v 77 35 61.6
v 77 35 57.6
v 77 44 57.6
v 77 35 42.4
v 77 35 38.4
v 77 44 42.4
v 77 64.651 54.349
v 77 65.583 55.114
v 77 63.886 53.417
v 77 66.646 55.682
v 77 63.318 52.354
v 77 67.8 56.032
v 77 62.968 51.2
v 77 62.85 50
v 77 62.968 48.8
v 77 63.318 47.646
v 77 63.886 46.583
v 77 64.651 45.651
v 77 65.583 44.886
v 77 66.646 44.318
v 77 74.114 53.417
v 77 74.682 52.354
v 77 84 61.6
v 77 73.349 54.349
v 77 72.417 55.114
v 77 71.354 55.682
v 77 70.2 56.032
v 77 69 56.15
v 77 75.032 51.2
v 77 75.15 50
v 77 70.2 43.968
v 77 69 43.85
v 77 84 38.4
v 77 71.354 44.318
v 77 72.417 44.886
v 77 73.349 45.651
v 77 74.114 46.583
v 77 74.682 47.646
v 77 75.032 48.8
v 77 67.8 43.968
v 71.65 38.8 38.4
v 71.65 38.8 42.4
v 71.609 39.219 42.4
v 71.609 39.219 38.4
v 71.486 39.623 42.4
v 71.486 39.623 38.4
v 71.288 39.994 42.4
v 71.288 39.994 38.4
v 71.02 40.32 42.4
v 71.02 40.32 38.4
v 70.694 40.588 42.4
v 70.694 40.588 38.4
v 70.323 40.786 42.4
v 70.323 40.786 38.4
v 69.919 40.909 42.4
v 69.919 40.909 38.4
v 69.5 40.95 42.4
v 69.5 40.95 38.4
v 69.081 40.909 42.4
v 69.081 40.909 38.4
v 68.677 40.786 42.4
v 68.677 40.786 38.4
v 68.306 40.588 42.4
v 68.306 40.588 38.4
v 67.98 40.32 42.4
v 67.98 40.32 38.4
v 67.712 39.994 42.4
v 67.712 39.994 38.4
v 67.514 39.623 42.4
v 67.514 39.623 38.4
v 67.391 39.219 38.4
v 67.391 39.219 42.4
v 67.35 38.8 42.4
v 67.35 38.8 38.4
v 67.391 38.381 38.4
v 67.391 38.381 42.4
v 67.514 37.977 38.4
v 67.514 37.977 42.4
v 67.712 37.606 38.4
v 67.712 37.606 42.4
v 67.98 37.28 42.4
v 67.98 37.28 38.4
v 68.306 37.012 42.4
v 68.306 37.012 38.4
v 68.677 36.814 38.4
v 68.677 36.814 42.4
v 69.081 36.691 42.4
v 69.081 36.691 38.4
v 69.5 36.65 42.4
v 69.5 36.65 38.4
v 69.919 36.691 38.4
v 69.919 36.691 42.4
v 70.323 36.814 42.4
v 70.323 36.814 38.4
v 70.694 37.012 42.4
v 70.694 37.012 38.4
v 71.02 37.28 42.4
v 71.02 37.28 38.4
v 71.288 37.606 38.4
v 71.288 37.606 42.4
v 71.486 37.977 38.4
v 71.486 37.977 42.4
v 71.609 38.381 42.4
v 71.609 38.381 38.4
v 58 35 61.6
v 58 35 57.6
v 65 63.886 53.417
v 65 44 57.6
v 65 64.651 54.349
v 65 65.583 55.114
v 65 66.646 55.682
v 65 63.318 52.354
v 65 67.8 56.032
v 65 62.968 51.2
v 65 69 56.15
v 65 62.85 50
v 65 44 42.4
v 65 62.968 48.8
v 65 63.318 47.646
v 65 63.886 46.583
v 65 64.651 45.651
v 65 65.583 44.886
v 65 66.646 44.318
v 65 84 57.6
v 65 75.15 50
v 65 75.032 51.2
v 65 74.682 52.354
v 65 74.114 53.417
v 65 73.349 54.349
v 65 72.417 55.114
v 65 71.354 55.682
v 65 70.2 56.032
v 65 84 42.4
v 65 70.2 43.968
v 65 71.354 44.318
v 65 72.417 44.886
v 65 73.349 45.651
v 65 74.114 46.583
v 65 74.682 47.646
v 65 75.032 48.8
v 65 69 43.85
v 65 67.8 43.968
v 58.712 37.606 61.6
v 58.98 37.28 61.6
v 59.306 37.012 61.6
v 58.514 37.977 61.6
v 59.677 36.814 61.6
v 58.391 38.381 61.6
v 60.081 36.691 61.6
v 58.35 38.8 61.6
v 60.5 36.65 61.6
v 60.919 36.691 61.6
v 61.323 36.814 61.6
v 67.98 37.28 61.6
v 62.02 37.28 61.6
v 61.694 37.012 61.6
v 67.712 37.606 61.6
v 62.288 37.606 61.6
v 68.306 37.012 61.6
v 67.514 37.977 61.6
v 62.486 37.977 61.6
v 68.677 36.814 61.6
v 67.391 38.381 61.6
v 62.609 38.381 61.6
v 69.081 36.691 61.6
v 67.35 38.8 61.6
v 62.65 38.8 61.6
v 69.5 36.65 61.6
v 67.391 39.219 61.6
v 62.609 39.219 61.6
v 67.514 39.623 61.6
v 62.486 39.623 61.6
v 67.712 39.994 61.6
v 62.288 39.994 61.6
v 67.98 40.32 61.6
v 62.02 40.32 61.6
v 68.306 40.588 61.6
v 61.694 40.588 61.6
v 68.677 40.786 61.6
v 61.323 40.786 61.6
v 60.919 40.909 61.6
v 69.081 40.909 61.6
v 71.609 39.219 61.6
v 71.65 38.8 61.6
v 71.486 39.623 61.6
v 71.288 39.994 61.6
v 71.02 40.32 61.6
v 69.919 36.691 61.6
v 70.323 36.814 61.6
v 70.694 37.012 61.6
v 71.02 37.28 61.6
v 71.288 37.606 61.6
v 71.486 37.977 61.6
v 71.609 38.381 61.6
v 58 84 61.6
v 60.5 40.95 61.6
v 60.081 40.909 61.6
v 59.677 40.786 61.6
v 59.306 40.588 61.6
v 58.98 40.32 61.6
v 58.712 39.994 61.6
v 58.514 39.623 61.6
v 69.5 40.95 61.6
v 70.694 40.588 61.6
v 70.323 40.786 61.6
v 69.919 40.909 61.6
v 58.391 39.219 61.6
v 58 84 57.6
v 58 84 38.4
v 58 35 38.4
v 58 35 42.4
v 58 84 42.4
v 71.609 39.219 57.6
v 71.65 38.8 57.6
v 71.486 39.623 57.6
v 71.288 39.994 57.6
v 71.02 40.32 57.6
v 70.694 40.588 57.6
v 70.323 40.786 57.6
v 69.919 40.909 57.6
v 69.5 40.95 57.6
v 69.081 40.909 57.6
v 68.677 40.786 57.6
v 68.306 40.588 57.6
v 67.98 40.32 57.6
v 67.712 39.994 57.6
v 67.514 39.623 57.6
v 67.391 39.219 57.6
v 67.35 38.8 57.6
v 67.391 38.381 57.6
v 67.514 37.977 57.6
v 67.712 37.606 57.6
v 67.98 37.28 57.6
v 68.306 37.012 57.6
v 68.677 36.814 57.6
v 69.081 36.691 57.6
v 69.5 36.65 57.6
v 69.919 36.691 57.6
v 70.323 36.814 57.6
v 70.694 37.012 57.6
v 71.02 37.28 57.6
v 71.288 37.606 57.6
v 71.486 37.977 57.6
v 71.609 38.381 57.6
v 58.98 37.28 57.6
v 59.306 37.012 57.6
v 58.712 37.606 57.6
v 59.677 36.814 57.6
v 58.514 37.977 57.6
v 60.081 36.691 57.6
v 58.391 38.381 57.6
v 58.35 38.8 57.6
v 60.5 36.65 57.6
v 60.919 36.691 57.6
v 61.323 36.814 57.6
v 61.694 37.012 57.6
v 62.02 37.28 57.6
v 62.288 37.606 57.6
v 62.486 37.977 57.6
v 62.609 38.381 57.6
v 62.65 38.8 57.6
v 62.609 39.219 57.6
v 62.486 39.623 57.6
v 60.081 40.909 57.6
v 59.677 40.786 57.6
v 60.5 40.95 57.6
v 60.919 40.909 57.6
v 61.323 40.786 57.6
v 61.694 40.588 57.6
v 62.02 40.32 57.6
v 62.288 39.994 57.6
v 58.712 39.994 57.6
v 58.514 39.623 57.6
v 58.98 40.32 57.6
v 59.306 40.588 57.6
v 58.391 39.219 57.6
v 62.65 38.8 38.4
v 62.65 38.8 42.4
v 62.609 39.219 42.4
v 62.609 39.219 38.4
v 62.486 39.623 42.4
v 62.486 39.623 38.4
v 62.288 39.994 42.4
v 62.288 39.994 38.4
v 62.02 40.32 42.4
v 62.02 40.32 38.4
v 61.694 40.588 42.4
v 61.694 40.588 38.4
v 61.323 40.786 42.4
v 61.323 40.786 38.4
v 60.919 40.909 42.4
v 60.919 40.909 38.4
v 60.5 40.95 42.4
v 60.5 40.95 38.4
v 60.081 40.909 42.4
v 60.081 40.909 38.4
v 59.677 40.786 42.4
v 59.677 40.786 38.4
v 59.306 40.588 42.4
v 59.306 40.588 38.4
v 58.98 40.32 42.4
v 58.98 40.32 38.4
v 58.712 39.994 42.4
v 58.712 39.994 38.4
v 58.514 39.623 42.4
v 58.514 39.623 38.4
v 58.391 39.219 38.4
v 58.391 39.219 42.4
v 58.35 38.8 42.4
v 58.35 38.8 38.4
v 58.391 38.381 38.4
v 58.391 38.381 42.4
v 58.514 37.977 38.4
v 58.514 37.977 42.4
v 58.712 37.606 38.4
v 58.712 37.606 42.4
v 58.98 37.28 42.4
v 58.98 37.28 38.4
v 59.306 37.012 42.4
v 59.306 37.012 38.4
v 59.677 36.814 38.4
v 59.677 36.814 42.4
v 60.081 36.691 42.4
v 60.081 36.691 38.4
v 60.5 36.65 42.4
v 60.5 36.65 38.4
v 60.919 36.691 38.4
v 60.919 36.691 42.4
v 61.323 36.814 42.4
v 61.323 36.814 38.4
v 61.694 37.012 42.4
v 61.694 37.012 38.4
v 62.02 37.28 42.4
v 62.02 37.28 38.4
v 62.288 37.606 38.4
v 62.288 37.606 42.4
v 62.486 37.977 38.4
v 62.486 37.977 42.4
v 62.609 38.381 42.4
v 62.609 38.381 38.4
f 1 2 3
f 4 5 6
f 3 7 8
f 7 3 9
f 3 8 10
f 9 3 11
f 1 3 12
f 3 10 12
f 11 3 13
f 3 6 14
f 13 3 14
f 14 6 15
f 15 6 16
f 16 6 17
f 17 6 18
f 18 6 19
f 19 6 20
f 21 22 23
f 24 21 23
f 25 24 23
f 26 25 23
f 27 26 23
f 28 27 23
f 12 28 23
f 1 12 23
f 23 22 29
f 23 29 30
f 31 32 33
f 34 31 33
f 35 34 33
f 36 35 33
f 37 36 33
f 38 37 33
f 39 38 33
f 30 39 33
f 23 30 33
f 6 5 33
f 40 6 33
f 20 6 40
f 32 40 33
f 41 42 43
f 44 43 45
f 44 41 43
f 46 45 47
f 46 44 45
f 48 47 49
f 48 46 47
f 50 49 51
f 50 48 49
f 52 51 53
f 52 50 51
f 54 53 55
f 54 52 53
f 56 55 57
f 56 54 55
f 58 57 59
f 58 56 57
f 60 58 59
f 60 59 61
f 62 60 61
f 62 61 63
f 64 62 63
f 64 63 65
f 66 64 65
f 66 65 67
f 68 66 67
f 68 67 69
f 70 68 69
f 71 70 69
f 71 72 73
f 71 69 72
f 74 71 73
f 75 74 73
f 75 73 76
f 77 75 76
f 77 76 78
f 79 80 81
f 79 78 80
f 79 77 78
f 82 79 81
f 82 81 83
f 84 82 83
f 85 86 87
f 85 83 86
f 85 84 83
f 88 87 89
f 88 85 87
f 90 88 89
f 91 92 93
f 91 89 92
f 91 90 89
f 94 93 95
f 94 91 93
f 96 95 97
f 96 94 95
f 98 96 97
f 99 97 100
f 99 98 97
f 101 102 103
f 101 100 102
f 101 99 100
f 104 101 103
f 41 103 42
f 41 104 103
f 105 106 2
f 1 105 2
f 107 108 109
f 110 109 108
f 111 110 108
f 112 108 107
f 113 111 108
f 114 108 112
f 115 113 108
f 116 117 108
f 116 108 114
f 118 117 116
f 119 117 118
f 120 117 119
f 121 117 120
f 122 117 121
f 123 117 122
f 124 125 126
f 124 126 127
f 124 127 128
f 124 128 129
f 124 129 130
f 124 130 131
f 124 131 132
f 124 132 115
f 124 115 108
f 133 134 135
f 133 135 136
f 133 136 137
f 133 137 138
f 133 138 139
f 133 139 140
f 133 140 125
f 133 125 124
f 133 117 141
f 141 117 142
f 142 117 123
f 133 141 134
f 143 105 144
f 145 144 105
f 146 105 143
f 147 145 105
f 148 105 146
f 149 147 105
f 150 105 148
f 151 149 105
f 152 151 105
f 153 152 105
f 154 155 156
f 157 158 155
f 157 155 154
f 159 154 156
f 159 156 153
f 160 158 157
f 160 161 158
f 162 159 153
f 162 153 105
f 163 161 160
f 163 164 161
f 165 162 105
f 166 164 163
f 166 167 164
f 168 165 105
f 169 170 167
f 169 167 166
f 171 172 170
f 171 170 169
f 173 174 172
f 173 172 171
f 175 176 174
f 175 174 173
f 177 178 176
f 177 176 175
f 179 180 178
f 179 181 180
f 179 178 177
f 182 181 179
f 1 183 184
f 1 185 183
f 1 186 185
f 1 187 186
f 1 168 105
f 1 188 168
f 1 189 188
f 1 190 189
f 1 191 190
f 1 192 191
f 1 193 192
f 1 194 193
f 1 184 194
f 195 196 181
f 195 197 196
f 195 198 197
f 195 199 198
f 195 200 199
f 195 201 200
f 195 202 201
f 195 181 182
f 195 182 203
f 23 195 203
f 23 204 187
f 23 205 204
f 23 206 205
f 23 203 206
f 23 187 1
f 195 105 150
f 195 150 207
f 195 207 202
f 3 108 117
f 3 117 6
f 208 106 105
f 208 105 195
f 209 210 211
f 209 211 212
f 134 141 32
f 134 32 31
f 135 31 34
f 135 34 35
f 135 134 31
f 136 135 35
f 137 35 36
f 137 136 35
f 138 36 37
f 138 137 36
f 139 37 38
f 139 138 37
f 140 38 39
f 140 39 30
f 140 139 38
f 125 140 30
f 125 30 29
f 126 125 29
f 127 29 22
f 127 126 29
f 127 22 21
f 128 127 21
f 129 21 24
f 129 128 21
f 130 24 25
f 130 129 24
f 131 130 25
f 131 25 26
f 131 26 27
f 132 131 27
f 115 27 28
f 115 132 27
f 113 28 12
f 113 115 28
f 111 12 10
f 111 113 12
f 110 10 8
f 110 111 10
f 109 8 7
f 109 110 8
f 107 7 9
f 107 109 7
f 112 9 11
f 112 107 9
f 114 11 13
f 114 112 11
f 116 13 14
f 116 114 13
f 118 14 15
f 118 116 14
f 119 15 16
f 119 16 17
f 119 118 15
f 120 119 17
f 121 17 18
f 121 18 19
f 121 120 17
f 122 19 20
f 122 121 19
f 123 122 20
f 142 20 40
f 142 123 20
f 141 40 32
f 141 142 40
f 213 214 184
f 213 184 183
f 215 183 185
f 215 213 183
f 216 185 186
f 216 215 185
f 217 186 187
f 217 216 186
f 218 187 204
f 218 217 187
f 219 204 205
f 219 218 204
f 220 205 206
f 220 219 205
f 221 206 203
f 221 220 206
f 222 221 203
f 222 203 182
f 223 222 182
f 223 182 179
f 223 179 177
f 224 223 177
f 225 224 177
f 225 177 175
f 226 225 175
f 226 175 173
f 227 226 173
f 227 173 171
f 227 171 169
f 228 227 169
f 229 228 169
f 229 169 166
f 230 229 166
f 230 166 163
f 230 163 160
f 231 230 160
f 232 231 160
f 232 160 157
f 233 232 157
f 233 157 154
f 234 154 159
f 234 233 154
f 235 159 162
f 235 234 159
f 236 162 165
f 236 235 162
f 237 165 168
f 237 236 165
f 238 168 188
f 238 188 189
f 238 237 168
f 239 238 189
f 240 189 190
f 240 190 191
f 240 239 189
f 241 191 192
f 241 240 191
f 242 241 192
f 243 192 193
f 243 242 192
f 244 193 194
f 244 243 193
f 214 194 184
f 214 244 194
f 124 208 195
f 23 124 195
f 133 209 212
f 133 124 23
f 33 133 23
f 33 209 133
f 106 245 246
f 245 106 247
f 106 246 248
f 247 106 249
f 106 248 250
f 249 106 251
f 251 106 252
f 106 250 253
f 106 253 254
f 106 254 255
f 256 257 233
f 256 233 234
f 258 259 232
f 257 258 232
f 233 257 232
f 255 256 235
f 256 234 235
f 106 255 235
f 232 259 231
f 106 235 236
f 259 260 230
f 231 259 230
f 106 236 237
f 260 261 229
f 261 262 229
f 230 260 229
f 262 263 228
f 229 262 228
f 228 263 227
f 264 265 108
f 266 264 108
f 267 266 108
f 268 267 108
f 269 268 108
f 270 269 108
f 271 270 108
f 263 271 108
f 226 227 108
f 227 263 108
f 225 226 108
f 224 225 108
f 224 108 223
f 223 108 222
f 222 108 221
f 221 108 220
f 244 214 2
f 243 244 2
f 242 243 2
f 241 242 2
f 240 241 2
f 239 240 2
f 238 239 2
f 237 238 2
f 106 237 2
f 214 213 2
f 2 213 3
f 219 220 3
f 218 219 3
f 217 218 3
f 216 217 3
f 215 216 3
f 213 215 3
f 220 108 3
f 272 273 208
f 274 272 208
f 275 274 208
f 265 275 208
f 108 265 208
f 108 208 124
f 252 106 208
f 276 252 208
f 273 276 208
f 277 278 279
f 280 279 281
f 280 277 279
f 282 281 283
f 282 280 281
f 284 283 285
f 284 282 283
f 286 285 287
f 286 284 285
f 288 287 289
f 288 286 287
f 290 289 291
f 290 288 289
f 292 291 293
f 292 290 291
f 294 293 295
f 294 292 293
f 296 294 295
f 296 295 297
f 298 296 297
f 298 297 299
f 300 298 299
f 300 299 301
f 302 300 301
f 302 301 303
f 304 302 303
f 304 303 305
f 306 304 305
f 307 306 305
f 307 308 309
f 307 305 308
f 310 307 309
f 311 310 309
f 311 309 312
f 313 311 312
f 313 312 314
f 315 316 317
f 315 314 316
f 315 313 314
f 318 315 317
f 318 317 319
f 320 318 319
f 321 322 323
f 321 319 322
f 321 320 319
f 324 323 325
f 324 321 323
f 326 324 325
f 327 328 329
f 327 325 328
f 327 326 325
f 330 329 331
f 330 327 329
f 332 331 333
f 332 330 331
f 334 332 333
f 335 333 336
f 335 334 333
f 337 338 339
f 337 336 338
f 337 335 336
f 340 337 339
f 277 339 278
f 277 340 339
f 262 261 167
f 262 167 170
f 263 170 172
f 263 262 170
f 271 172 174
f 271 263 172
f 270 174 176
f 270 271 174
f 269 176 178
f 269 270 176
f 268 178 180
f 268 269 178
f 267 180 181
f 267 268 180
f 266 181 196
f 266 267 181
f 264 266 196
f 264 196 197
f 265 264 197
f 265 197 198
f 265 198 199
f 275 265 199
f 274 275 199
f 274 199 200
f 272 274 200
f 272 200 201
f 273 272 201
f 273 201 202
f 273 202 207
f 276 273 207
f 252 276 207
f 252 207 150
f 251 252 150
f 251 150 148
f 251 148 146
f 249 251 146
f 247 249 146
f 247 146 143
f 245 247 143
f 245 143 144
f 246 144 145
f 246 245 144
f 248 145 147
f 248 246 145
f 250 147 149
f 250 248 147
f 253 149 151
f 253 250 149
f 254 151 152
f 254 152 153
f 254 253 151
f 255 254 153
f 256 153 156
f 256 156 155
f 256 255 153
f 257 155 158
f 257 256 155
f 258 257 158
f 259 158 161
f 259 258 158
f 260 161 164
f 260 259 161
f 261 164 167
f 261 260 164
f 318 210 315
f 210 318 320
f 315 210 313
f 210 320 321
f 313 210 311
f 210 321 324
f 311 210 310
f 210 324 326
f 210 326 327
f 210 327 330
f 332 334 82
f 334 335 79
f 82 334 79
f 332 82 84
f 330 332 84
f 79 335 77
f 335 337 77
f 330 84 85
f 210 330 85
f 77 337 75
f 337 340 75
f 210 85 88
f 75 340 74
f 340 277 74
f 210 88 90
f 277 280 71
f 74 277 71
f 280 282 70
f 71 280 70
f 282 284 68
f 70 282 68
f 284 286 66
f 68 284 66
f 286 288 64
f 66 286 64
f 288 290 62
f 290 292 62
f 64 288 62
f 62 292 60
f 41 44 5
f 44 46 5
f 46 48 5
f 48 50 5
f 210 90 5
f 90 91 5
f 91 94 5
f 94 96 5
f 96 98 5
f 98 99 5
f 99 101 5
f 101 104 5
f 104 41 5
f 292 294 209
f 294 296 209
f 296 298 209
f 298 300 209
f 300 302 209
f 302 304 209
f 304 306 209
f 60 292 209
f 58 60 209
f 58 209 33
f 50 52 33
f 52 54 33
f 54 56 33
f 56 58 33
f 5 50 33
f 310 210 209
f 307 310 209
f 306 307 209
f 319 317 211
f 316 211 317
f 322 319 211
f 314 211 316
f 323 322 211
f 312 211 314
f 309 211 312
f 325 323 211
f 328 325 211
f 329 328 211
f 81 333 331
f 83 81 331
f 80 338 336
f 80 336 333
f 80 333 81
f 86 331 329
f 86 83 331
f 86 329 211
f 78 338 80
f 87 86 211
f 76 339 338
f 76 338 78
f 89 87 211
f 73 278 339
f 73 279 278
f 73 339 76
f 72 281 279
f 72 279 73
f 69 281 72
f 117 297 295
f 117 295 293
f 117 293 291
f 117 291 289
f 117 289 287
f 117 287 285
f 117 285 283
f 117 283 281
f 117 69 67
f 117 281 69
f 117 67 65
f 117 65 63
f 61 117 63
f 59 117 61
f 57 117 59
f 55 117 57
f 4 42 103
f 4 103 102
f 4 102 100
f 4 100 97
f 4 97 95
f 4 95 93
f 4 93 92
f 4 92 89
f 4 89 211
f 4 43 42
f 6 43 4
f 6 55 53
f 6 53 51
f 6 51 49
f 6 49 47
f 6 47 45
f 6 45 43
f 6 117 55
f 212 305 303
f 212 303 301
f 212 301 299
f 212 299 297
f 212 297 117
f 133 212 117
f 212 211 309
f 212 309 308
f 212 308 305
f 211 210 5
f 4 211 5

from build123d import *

# Parameters (mm, degrees)
GUIDED_START                               = 38.4
SKETCH1_W                                  = 12
SKETCH1_H                                  = 40
GUIDED_BRIDGE_WITH_ROD_COUPLING_SEAT_DEPTH = 23.2
LOWER_START                                = 38.4
SKETCH2_W                                  = 19
SKETCH2_H                                  = 49
LOWER_RACK_LAP_DEPTH                       = 4
UPPER_START                                = 57.6
SKETCH3_W                                  = 19
SKETCH3_H                                  = 49
UPPER_RACK_LAP_DEPTH                       = 4
M4_START                                   = 38.4
SKETCH4_R                                  = 2.15
M4_JOINT_BOLT_CLEARANCE_DEPTH              = 23.2
RADIAL_START                               = 65
SKETCH5_R                                  = 6.15
RADIAL_FLOATING_STUD_CLEARANCE_DEPTH       = 12


with BuildPart() as part:
    # Sketch1 → Guided bridge with rod coupling seat (new body)
    with BuildSketch(Plane.XY.offset(GUIDED_START)):
        with Locations((71, 64)):
            Rectangle(SKETCH1_W, SKETCH1_H)
    extrude(amount=GUIDED_BRIDGE_WITH_ROD_COUPLING_SEAT_DEPTH)

    # Sketch2 → Lower rack lap (add)
    with BuildSketch(Plane.XY.offset(LOWER_START)):
        with Locations((67.5, 59.5)):
            Rectangle(SKETCH2_W, SKETCH2_H)
    extrude(amount=LOWER_RACK_LAP_DEPTH)

    # Sketch3 → Upper rack lap (add)
    with BuildSketch(Plane.XY.offset(UPPER_START)):
        with Locations((67.5, 59.5)):
            Rectangle(SKETCH3_W, SKETCH3_H)
    extrude(amount=UPPER_RACK_LAP_DEPTH)

    # Sketch4 → M4 joint bolt clearance (cut)
    with BuildSketch(Plane.XY.offset(M4_START)):
        with Locations((60.5, 38.8)):
            Circle(SKETCH4_R)
        with Locations((69.5, 38.8)):
            Circle(SKETCH4_R)
    extrude(amount=M4_JOINT_BOLT_CLEARANCE_DEPTH, mode=Mode.SUBTRACT)

    # Sketch5 → Radial floating stud clearance (cut)
    with BuildSketch(Plane(origin=(0, 0, 0), x_dir=(0, 0, -1), z_dir=(1, 0, 0)).offset(RADIAL_START)):
        with Locations((-50, 69)):
            Circle(SKETCH5_R)
    extrude(amount=RADIAL_FLOATING_STUD_CLEARANCE_DEPTH, mode=Mode.SUBTRACT)


solid = part.part
